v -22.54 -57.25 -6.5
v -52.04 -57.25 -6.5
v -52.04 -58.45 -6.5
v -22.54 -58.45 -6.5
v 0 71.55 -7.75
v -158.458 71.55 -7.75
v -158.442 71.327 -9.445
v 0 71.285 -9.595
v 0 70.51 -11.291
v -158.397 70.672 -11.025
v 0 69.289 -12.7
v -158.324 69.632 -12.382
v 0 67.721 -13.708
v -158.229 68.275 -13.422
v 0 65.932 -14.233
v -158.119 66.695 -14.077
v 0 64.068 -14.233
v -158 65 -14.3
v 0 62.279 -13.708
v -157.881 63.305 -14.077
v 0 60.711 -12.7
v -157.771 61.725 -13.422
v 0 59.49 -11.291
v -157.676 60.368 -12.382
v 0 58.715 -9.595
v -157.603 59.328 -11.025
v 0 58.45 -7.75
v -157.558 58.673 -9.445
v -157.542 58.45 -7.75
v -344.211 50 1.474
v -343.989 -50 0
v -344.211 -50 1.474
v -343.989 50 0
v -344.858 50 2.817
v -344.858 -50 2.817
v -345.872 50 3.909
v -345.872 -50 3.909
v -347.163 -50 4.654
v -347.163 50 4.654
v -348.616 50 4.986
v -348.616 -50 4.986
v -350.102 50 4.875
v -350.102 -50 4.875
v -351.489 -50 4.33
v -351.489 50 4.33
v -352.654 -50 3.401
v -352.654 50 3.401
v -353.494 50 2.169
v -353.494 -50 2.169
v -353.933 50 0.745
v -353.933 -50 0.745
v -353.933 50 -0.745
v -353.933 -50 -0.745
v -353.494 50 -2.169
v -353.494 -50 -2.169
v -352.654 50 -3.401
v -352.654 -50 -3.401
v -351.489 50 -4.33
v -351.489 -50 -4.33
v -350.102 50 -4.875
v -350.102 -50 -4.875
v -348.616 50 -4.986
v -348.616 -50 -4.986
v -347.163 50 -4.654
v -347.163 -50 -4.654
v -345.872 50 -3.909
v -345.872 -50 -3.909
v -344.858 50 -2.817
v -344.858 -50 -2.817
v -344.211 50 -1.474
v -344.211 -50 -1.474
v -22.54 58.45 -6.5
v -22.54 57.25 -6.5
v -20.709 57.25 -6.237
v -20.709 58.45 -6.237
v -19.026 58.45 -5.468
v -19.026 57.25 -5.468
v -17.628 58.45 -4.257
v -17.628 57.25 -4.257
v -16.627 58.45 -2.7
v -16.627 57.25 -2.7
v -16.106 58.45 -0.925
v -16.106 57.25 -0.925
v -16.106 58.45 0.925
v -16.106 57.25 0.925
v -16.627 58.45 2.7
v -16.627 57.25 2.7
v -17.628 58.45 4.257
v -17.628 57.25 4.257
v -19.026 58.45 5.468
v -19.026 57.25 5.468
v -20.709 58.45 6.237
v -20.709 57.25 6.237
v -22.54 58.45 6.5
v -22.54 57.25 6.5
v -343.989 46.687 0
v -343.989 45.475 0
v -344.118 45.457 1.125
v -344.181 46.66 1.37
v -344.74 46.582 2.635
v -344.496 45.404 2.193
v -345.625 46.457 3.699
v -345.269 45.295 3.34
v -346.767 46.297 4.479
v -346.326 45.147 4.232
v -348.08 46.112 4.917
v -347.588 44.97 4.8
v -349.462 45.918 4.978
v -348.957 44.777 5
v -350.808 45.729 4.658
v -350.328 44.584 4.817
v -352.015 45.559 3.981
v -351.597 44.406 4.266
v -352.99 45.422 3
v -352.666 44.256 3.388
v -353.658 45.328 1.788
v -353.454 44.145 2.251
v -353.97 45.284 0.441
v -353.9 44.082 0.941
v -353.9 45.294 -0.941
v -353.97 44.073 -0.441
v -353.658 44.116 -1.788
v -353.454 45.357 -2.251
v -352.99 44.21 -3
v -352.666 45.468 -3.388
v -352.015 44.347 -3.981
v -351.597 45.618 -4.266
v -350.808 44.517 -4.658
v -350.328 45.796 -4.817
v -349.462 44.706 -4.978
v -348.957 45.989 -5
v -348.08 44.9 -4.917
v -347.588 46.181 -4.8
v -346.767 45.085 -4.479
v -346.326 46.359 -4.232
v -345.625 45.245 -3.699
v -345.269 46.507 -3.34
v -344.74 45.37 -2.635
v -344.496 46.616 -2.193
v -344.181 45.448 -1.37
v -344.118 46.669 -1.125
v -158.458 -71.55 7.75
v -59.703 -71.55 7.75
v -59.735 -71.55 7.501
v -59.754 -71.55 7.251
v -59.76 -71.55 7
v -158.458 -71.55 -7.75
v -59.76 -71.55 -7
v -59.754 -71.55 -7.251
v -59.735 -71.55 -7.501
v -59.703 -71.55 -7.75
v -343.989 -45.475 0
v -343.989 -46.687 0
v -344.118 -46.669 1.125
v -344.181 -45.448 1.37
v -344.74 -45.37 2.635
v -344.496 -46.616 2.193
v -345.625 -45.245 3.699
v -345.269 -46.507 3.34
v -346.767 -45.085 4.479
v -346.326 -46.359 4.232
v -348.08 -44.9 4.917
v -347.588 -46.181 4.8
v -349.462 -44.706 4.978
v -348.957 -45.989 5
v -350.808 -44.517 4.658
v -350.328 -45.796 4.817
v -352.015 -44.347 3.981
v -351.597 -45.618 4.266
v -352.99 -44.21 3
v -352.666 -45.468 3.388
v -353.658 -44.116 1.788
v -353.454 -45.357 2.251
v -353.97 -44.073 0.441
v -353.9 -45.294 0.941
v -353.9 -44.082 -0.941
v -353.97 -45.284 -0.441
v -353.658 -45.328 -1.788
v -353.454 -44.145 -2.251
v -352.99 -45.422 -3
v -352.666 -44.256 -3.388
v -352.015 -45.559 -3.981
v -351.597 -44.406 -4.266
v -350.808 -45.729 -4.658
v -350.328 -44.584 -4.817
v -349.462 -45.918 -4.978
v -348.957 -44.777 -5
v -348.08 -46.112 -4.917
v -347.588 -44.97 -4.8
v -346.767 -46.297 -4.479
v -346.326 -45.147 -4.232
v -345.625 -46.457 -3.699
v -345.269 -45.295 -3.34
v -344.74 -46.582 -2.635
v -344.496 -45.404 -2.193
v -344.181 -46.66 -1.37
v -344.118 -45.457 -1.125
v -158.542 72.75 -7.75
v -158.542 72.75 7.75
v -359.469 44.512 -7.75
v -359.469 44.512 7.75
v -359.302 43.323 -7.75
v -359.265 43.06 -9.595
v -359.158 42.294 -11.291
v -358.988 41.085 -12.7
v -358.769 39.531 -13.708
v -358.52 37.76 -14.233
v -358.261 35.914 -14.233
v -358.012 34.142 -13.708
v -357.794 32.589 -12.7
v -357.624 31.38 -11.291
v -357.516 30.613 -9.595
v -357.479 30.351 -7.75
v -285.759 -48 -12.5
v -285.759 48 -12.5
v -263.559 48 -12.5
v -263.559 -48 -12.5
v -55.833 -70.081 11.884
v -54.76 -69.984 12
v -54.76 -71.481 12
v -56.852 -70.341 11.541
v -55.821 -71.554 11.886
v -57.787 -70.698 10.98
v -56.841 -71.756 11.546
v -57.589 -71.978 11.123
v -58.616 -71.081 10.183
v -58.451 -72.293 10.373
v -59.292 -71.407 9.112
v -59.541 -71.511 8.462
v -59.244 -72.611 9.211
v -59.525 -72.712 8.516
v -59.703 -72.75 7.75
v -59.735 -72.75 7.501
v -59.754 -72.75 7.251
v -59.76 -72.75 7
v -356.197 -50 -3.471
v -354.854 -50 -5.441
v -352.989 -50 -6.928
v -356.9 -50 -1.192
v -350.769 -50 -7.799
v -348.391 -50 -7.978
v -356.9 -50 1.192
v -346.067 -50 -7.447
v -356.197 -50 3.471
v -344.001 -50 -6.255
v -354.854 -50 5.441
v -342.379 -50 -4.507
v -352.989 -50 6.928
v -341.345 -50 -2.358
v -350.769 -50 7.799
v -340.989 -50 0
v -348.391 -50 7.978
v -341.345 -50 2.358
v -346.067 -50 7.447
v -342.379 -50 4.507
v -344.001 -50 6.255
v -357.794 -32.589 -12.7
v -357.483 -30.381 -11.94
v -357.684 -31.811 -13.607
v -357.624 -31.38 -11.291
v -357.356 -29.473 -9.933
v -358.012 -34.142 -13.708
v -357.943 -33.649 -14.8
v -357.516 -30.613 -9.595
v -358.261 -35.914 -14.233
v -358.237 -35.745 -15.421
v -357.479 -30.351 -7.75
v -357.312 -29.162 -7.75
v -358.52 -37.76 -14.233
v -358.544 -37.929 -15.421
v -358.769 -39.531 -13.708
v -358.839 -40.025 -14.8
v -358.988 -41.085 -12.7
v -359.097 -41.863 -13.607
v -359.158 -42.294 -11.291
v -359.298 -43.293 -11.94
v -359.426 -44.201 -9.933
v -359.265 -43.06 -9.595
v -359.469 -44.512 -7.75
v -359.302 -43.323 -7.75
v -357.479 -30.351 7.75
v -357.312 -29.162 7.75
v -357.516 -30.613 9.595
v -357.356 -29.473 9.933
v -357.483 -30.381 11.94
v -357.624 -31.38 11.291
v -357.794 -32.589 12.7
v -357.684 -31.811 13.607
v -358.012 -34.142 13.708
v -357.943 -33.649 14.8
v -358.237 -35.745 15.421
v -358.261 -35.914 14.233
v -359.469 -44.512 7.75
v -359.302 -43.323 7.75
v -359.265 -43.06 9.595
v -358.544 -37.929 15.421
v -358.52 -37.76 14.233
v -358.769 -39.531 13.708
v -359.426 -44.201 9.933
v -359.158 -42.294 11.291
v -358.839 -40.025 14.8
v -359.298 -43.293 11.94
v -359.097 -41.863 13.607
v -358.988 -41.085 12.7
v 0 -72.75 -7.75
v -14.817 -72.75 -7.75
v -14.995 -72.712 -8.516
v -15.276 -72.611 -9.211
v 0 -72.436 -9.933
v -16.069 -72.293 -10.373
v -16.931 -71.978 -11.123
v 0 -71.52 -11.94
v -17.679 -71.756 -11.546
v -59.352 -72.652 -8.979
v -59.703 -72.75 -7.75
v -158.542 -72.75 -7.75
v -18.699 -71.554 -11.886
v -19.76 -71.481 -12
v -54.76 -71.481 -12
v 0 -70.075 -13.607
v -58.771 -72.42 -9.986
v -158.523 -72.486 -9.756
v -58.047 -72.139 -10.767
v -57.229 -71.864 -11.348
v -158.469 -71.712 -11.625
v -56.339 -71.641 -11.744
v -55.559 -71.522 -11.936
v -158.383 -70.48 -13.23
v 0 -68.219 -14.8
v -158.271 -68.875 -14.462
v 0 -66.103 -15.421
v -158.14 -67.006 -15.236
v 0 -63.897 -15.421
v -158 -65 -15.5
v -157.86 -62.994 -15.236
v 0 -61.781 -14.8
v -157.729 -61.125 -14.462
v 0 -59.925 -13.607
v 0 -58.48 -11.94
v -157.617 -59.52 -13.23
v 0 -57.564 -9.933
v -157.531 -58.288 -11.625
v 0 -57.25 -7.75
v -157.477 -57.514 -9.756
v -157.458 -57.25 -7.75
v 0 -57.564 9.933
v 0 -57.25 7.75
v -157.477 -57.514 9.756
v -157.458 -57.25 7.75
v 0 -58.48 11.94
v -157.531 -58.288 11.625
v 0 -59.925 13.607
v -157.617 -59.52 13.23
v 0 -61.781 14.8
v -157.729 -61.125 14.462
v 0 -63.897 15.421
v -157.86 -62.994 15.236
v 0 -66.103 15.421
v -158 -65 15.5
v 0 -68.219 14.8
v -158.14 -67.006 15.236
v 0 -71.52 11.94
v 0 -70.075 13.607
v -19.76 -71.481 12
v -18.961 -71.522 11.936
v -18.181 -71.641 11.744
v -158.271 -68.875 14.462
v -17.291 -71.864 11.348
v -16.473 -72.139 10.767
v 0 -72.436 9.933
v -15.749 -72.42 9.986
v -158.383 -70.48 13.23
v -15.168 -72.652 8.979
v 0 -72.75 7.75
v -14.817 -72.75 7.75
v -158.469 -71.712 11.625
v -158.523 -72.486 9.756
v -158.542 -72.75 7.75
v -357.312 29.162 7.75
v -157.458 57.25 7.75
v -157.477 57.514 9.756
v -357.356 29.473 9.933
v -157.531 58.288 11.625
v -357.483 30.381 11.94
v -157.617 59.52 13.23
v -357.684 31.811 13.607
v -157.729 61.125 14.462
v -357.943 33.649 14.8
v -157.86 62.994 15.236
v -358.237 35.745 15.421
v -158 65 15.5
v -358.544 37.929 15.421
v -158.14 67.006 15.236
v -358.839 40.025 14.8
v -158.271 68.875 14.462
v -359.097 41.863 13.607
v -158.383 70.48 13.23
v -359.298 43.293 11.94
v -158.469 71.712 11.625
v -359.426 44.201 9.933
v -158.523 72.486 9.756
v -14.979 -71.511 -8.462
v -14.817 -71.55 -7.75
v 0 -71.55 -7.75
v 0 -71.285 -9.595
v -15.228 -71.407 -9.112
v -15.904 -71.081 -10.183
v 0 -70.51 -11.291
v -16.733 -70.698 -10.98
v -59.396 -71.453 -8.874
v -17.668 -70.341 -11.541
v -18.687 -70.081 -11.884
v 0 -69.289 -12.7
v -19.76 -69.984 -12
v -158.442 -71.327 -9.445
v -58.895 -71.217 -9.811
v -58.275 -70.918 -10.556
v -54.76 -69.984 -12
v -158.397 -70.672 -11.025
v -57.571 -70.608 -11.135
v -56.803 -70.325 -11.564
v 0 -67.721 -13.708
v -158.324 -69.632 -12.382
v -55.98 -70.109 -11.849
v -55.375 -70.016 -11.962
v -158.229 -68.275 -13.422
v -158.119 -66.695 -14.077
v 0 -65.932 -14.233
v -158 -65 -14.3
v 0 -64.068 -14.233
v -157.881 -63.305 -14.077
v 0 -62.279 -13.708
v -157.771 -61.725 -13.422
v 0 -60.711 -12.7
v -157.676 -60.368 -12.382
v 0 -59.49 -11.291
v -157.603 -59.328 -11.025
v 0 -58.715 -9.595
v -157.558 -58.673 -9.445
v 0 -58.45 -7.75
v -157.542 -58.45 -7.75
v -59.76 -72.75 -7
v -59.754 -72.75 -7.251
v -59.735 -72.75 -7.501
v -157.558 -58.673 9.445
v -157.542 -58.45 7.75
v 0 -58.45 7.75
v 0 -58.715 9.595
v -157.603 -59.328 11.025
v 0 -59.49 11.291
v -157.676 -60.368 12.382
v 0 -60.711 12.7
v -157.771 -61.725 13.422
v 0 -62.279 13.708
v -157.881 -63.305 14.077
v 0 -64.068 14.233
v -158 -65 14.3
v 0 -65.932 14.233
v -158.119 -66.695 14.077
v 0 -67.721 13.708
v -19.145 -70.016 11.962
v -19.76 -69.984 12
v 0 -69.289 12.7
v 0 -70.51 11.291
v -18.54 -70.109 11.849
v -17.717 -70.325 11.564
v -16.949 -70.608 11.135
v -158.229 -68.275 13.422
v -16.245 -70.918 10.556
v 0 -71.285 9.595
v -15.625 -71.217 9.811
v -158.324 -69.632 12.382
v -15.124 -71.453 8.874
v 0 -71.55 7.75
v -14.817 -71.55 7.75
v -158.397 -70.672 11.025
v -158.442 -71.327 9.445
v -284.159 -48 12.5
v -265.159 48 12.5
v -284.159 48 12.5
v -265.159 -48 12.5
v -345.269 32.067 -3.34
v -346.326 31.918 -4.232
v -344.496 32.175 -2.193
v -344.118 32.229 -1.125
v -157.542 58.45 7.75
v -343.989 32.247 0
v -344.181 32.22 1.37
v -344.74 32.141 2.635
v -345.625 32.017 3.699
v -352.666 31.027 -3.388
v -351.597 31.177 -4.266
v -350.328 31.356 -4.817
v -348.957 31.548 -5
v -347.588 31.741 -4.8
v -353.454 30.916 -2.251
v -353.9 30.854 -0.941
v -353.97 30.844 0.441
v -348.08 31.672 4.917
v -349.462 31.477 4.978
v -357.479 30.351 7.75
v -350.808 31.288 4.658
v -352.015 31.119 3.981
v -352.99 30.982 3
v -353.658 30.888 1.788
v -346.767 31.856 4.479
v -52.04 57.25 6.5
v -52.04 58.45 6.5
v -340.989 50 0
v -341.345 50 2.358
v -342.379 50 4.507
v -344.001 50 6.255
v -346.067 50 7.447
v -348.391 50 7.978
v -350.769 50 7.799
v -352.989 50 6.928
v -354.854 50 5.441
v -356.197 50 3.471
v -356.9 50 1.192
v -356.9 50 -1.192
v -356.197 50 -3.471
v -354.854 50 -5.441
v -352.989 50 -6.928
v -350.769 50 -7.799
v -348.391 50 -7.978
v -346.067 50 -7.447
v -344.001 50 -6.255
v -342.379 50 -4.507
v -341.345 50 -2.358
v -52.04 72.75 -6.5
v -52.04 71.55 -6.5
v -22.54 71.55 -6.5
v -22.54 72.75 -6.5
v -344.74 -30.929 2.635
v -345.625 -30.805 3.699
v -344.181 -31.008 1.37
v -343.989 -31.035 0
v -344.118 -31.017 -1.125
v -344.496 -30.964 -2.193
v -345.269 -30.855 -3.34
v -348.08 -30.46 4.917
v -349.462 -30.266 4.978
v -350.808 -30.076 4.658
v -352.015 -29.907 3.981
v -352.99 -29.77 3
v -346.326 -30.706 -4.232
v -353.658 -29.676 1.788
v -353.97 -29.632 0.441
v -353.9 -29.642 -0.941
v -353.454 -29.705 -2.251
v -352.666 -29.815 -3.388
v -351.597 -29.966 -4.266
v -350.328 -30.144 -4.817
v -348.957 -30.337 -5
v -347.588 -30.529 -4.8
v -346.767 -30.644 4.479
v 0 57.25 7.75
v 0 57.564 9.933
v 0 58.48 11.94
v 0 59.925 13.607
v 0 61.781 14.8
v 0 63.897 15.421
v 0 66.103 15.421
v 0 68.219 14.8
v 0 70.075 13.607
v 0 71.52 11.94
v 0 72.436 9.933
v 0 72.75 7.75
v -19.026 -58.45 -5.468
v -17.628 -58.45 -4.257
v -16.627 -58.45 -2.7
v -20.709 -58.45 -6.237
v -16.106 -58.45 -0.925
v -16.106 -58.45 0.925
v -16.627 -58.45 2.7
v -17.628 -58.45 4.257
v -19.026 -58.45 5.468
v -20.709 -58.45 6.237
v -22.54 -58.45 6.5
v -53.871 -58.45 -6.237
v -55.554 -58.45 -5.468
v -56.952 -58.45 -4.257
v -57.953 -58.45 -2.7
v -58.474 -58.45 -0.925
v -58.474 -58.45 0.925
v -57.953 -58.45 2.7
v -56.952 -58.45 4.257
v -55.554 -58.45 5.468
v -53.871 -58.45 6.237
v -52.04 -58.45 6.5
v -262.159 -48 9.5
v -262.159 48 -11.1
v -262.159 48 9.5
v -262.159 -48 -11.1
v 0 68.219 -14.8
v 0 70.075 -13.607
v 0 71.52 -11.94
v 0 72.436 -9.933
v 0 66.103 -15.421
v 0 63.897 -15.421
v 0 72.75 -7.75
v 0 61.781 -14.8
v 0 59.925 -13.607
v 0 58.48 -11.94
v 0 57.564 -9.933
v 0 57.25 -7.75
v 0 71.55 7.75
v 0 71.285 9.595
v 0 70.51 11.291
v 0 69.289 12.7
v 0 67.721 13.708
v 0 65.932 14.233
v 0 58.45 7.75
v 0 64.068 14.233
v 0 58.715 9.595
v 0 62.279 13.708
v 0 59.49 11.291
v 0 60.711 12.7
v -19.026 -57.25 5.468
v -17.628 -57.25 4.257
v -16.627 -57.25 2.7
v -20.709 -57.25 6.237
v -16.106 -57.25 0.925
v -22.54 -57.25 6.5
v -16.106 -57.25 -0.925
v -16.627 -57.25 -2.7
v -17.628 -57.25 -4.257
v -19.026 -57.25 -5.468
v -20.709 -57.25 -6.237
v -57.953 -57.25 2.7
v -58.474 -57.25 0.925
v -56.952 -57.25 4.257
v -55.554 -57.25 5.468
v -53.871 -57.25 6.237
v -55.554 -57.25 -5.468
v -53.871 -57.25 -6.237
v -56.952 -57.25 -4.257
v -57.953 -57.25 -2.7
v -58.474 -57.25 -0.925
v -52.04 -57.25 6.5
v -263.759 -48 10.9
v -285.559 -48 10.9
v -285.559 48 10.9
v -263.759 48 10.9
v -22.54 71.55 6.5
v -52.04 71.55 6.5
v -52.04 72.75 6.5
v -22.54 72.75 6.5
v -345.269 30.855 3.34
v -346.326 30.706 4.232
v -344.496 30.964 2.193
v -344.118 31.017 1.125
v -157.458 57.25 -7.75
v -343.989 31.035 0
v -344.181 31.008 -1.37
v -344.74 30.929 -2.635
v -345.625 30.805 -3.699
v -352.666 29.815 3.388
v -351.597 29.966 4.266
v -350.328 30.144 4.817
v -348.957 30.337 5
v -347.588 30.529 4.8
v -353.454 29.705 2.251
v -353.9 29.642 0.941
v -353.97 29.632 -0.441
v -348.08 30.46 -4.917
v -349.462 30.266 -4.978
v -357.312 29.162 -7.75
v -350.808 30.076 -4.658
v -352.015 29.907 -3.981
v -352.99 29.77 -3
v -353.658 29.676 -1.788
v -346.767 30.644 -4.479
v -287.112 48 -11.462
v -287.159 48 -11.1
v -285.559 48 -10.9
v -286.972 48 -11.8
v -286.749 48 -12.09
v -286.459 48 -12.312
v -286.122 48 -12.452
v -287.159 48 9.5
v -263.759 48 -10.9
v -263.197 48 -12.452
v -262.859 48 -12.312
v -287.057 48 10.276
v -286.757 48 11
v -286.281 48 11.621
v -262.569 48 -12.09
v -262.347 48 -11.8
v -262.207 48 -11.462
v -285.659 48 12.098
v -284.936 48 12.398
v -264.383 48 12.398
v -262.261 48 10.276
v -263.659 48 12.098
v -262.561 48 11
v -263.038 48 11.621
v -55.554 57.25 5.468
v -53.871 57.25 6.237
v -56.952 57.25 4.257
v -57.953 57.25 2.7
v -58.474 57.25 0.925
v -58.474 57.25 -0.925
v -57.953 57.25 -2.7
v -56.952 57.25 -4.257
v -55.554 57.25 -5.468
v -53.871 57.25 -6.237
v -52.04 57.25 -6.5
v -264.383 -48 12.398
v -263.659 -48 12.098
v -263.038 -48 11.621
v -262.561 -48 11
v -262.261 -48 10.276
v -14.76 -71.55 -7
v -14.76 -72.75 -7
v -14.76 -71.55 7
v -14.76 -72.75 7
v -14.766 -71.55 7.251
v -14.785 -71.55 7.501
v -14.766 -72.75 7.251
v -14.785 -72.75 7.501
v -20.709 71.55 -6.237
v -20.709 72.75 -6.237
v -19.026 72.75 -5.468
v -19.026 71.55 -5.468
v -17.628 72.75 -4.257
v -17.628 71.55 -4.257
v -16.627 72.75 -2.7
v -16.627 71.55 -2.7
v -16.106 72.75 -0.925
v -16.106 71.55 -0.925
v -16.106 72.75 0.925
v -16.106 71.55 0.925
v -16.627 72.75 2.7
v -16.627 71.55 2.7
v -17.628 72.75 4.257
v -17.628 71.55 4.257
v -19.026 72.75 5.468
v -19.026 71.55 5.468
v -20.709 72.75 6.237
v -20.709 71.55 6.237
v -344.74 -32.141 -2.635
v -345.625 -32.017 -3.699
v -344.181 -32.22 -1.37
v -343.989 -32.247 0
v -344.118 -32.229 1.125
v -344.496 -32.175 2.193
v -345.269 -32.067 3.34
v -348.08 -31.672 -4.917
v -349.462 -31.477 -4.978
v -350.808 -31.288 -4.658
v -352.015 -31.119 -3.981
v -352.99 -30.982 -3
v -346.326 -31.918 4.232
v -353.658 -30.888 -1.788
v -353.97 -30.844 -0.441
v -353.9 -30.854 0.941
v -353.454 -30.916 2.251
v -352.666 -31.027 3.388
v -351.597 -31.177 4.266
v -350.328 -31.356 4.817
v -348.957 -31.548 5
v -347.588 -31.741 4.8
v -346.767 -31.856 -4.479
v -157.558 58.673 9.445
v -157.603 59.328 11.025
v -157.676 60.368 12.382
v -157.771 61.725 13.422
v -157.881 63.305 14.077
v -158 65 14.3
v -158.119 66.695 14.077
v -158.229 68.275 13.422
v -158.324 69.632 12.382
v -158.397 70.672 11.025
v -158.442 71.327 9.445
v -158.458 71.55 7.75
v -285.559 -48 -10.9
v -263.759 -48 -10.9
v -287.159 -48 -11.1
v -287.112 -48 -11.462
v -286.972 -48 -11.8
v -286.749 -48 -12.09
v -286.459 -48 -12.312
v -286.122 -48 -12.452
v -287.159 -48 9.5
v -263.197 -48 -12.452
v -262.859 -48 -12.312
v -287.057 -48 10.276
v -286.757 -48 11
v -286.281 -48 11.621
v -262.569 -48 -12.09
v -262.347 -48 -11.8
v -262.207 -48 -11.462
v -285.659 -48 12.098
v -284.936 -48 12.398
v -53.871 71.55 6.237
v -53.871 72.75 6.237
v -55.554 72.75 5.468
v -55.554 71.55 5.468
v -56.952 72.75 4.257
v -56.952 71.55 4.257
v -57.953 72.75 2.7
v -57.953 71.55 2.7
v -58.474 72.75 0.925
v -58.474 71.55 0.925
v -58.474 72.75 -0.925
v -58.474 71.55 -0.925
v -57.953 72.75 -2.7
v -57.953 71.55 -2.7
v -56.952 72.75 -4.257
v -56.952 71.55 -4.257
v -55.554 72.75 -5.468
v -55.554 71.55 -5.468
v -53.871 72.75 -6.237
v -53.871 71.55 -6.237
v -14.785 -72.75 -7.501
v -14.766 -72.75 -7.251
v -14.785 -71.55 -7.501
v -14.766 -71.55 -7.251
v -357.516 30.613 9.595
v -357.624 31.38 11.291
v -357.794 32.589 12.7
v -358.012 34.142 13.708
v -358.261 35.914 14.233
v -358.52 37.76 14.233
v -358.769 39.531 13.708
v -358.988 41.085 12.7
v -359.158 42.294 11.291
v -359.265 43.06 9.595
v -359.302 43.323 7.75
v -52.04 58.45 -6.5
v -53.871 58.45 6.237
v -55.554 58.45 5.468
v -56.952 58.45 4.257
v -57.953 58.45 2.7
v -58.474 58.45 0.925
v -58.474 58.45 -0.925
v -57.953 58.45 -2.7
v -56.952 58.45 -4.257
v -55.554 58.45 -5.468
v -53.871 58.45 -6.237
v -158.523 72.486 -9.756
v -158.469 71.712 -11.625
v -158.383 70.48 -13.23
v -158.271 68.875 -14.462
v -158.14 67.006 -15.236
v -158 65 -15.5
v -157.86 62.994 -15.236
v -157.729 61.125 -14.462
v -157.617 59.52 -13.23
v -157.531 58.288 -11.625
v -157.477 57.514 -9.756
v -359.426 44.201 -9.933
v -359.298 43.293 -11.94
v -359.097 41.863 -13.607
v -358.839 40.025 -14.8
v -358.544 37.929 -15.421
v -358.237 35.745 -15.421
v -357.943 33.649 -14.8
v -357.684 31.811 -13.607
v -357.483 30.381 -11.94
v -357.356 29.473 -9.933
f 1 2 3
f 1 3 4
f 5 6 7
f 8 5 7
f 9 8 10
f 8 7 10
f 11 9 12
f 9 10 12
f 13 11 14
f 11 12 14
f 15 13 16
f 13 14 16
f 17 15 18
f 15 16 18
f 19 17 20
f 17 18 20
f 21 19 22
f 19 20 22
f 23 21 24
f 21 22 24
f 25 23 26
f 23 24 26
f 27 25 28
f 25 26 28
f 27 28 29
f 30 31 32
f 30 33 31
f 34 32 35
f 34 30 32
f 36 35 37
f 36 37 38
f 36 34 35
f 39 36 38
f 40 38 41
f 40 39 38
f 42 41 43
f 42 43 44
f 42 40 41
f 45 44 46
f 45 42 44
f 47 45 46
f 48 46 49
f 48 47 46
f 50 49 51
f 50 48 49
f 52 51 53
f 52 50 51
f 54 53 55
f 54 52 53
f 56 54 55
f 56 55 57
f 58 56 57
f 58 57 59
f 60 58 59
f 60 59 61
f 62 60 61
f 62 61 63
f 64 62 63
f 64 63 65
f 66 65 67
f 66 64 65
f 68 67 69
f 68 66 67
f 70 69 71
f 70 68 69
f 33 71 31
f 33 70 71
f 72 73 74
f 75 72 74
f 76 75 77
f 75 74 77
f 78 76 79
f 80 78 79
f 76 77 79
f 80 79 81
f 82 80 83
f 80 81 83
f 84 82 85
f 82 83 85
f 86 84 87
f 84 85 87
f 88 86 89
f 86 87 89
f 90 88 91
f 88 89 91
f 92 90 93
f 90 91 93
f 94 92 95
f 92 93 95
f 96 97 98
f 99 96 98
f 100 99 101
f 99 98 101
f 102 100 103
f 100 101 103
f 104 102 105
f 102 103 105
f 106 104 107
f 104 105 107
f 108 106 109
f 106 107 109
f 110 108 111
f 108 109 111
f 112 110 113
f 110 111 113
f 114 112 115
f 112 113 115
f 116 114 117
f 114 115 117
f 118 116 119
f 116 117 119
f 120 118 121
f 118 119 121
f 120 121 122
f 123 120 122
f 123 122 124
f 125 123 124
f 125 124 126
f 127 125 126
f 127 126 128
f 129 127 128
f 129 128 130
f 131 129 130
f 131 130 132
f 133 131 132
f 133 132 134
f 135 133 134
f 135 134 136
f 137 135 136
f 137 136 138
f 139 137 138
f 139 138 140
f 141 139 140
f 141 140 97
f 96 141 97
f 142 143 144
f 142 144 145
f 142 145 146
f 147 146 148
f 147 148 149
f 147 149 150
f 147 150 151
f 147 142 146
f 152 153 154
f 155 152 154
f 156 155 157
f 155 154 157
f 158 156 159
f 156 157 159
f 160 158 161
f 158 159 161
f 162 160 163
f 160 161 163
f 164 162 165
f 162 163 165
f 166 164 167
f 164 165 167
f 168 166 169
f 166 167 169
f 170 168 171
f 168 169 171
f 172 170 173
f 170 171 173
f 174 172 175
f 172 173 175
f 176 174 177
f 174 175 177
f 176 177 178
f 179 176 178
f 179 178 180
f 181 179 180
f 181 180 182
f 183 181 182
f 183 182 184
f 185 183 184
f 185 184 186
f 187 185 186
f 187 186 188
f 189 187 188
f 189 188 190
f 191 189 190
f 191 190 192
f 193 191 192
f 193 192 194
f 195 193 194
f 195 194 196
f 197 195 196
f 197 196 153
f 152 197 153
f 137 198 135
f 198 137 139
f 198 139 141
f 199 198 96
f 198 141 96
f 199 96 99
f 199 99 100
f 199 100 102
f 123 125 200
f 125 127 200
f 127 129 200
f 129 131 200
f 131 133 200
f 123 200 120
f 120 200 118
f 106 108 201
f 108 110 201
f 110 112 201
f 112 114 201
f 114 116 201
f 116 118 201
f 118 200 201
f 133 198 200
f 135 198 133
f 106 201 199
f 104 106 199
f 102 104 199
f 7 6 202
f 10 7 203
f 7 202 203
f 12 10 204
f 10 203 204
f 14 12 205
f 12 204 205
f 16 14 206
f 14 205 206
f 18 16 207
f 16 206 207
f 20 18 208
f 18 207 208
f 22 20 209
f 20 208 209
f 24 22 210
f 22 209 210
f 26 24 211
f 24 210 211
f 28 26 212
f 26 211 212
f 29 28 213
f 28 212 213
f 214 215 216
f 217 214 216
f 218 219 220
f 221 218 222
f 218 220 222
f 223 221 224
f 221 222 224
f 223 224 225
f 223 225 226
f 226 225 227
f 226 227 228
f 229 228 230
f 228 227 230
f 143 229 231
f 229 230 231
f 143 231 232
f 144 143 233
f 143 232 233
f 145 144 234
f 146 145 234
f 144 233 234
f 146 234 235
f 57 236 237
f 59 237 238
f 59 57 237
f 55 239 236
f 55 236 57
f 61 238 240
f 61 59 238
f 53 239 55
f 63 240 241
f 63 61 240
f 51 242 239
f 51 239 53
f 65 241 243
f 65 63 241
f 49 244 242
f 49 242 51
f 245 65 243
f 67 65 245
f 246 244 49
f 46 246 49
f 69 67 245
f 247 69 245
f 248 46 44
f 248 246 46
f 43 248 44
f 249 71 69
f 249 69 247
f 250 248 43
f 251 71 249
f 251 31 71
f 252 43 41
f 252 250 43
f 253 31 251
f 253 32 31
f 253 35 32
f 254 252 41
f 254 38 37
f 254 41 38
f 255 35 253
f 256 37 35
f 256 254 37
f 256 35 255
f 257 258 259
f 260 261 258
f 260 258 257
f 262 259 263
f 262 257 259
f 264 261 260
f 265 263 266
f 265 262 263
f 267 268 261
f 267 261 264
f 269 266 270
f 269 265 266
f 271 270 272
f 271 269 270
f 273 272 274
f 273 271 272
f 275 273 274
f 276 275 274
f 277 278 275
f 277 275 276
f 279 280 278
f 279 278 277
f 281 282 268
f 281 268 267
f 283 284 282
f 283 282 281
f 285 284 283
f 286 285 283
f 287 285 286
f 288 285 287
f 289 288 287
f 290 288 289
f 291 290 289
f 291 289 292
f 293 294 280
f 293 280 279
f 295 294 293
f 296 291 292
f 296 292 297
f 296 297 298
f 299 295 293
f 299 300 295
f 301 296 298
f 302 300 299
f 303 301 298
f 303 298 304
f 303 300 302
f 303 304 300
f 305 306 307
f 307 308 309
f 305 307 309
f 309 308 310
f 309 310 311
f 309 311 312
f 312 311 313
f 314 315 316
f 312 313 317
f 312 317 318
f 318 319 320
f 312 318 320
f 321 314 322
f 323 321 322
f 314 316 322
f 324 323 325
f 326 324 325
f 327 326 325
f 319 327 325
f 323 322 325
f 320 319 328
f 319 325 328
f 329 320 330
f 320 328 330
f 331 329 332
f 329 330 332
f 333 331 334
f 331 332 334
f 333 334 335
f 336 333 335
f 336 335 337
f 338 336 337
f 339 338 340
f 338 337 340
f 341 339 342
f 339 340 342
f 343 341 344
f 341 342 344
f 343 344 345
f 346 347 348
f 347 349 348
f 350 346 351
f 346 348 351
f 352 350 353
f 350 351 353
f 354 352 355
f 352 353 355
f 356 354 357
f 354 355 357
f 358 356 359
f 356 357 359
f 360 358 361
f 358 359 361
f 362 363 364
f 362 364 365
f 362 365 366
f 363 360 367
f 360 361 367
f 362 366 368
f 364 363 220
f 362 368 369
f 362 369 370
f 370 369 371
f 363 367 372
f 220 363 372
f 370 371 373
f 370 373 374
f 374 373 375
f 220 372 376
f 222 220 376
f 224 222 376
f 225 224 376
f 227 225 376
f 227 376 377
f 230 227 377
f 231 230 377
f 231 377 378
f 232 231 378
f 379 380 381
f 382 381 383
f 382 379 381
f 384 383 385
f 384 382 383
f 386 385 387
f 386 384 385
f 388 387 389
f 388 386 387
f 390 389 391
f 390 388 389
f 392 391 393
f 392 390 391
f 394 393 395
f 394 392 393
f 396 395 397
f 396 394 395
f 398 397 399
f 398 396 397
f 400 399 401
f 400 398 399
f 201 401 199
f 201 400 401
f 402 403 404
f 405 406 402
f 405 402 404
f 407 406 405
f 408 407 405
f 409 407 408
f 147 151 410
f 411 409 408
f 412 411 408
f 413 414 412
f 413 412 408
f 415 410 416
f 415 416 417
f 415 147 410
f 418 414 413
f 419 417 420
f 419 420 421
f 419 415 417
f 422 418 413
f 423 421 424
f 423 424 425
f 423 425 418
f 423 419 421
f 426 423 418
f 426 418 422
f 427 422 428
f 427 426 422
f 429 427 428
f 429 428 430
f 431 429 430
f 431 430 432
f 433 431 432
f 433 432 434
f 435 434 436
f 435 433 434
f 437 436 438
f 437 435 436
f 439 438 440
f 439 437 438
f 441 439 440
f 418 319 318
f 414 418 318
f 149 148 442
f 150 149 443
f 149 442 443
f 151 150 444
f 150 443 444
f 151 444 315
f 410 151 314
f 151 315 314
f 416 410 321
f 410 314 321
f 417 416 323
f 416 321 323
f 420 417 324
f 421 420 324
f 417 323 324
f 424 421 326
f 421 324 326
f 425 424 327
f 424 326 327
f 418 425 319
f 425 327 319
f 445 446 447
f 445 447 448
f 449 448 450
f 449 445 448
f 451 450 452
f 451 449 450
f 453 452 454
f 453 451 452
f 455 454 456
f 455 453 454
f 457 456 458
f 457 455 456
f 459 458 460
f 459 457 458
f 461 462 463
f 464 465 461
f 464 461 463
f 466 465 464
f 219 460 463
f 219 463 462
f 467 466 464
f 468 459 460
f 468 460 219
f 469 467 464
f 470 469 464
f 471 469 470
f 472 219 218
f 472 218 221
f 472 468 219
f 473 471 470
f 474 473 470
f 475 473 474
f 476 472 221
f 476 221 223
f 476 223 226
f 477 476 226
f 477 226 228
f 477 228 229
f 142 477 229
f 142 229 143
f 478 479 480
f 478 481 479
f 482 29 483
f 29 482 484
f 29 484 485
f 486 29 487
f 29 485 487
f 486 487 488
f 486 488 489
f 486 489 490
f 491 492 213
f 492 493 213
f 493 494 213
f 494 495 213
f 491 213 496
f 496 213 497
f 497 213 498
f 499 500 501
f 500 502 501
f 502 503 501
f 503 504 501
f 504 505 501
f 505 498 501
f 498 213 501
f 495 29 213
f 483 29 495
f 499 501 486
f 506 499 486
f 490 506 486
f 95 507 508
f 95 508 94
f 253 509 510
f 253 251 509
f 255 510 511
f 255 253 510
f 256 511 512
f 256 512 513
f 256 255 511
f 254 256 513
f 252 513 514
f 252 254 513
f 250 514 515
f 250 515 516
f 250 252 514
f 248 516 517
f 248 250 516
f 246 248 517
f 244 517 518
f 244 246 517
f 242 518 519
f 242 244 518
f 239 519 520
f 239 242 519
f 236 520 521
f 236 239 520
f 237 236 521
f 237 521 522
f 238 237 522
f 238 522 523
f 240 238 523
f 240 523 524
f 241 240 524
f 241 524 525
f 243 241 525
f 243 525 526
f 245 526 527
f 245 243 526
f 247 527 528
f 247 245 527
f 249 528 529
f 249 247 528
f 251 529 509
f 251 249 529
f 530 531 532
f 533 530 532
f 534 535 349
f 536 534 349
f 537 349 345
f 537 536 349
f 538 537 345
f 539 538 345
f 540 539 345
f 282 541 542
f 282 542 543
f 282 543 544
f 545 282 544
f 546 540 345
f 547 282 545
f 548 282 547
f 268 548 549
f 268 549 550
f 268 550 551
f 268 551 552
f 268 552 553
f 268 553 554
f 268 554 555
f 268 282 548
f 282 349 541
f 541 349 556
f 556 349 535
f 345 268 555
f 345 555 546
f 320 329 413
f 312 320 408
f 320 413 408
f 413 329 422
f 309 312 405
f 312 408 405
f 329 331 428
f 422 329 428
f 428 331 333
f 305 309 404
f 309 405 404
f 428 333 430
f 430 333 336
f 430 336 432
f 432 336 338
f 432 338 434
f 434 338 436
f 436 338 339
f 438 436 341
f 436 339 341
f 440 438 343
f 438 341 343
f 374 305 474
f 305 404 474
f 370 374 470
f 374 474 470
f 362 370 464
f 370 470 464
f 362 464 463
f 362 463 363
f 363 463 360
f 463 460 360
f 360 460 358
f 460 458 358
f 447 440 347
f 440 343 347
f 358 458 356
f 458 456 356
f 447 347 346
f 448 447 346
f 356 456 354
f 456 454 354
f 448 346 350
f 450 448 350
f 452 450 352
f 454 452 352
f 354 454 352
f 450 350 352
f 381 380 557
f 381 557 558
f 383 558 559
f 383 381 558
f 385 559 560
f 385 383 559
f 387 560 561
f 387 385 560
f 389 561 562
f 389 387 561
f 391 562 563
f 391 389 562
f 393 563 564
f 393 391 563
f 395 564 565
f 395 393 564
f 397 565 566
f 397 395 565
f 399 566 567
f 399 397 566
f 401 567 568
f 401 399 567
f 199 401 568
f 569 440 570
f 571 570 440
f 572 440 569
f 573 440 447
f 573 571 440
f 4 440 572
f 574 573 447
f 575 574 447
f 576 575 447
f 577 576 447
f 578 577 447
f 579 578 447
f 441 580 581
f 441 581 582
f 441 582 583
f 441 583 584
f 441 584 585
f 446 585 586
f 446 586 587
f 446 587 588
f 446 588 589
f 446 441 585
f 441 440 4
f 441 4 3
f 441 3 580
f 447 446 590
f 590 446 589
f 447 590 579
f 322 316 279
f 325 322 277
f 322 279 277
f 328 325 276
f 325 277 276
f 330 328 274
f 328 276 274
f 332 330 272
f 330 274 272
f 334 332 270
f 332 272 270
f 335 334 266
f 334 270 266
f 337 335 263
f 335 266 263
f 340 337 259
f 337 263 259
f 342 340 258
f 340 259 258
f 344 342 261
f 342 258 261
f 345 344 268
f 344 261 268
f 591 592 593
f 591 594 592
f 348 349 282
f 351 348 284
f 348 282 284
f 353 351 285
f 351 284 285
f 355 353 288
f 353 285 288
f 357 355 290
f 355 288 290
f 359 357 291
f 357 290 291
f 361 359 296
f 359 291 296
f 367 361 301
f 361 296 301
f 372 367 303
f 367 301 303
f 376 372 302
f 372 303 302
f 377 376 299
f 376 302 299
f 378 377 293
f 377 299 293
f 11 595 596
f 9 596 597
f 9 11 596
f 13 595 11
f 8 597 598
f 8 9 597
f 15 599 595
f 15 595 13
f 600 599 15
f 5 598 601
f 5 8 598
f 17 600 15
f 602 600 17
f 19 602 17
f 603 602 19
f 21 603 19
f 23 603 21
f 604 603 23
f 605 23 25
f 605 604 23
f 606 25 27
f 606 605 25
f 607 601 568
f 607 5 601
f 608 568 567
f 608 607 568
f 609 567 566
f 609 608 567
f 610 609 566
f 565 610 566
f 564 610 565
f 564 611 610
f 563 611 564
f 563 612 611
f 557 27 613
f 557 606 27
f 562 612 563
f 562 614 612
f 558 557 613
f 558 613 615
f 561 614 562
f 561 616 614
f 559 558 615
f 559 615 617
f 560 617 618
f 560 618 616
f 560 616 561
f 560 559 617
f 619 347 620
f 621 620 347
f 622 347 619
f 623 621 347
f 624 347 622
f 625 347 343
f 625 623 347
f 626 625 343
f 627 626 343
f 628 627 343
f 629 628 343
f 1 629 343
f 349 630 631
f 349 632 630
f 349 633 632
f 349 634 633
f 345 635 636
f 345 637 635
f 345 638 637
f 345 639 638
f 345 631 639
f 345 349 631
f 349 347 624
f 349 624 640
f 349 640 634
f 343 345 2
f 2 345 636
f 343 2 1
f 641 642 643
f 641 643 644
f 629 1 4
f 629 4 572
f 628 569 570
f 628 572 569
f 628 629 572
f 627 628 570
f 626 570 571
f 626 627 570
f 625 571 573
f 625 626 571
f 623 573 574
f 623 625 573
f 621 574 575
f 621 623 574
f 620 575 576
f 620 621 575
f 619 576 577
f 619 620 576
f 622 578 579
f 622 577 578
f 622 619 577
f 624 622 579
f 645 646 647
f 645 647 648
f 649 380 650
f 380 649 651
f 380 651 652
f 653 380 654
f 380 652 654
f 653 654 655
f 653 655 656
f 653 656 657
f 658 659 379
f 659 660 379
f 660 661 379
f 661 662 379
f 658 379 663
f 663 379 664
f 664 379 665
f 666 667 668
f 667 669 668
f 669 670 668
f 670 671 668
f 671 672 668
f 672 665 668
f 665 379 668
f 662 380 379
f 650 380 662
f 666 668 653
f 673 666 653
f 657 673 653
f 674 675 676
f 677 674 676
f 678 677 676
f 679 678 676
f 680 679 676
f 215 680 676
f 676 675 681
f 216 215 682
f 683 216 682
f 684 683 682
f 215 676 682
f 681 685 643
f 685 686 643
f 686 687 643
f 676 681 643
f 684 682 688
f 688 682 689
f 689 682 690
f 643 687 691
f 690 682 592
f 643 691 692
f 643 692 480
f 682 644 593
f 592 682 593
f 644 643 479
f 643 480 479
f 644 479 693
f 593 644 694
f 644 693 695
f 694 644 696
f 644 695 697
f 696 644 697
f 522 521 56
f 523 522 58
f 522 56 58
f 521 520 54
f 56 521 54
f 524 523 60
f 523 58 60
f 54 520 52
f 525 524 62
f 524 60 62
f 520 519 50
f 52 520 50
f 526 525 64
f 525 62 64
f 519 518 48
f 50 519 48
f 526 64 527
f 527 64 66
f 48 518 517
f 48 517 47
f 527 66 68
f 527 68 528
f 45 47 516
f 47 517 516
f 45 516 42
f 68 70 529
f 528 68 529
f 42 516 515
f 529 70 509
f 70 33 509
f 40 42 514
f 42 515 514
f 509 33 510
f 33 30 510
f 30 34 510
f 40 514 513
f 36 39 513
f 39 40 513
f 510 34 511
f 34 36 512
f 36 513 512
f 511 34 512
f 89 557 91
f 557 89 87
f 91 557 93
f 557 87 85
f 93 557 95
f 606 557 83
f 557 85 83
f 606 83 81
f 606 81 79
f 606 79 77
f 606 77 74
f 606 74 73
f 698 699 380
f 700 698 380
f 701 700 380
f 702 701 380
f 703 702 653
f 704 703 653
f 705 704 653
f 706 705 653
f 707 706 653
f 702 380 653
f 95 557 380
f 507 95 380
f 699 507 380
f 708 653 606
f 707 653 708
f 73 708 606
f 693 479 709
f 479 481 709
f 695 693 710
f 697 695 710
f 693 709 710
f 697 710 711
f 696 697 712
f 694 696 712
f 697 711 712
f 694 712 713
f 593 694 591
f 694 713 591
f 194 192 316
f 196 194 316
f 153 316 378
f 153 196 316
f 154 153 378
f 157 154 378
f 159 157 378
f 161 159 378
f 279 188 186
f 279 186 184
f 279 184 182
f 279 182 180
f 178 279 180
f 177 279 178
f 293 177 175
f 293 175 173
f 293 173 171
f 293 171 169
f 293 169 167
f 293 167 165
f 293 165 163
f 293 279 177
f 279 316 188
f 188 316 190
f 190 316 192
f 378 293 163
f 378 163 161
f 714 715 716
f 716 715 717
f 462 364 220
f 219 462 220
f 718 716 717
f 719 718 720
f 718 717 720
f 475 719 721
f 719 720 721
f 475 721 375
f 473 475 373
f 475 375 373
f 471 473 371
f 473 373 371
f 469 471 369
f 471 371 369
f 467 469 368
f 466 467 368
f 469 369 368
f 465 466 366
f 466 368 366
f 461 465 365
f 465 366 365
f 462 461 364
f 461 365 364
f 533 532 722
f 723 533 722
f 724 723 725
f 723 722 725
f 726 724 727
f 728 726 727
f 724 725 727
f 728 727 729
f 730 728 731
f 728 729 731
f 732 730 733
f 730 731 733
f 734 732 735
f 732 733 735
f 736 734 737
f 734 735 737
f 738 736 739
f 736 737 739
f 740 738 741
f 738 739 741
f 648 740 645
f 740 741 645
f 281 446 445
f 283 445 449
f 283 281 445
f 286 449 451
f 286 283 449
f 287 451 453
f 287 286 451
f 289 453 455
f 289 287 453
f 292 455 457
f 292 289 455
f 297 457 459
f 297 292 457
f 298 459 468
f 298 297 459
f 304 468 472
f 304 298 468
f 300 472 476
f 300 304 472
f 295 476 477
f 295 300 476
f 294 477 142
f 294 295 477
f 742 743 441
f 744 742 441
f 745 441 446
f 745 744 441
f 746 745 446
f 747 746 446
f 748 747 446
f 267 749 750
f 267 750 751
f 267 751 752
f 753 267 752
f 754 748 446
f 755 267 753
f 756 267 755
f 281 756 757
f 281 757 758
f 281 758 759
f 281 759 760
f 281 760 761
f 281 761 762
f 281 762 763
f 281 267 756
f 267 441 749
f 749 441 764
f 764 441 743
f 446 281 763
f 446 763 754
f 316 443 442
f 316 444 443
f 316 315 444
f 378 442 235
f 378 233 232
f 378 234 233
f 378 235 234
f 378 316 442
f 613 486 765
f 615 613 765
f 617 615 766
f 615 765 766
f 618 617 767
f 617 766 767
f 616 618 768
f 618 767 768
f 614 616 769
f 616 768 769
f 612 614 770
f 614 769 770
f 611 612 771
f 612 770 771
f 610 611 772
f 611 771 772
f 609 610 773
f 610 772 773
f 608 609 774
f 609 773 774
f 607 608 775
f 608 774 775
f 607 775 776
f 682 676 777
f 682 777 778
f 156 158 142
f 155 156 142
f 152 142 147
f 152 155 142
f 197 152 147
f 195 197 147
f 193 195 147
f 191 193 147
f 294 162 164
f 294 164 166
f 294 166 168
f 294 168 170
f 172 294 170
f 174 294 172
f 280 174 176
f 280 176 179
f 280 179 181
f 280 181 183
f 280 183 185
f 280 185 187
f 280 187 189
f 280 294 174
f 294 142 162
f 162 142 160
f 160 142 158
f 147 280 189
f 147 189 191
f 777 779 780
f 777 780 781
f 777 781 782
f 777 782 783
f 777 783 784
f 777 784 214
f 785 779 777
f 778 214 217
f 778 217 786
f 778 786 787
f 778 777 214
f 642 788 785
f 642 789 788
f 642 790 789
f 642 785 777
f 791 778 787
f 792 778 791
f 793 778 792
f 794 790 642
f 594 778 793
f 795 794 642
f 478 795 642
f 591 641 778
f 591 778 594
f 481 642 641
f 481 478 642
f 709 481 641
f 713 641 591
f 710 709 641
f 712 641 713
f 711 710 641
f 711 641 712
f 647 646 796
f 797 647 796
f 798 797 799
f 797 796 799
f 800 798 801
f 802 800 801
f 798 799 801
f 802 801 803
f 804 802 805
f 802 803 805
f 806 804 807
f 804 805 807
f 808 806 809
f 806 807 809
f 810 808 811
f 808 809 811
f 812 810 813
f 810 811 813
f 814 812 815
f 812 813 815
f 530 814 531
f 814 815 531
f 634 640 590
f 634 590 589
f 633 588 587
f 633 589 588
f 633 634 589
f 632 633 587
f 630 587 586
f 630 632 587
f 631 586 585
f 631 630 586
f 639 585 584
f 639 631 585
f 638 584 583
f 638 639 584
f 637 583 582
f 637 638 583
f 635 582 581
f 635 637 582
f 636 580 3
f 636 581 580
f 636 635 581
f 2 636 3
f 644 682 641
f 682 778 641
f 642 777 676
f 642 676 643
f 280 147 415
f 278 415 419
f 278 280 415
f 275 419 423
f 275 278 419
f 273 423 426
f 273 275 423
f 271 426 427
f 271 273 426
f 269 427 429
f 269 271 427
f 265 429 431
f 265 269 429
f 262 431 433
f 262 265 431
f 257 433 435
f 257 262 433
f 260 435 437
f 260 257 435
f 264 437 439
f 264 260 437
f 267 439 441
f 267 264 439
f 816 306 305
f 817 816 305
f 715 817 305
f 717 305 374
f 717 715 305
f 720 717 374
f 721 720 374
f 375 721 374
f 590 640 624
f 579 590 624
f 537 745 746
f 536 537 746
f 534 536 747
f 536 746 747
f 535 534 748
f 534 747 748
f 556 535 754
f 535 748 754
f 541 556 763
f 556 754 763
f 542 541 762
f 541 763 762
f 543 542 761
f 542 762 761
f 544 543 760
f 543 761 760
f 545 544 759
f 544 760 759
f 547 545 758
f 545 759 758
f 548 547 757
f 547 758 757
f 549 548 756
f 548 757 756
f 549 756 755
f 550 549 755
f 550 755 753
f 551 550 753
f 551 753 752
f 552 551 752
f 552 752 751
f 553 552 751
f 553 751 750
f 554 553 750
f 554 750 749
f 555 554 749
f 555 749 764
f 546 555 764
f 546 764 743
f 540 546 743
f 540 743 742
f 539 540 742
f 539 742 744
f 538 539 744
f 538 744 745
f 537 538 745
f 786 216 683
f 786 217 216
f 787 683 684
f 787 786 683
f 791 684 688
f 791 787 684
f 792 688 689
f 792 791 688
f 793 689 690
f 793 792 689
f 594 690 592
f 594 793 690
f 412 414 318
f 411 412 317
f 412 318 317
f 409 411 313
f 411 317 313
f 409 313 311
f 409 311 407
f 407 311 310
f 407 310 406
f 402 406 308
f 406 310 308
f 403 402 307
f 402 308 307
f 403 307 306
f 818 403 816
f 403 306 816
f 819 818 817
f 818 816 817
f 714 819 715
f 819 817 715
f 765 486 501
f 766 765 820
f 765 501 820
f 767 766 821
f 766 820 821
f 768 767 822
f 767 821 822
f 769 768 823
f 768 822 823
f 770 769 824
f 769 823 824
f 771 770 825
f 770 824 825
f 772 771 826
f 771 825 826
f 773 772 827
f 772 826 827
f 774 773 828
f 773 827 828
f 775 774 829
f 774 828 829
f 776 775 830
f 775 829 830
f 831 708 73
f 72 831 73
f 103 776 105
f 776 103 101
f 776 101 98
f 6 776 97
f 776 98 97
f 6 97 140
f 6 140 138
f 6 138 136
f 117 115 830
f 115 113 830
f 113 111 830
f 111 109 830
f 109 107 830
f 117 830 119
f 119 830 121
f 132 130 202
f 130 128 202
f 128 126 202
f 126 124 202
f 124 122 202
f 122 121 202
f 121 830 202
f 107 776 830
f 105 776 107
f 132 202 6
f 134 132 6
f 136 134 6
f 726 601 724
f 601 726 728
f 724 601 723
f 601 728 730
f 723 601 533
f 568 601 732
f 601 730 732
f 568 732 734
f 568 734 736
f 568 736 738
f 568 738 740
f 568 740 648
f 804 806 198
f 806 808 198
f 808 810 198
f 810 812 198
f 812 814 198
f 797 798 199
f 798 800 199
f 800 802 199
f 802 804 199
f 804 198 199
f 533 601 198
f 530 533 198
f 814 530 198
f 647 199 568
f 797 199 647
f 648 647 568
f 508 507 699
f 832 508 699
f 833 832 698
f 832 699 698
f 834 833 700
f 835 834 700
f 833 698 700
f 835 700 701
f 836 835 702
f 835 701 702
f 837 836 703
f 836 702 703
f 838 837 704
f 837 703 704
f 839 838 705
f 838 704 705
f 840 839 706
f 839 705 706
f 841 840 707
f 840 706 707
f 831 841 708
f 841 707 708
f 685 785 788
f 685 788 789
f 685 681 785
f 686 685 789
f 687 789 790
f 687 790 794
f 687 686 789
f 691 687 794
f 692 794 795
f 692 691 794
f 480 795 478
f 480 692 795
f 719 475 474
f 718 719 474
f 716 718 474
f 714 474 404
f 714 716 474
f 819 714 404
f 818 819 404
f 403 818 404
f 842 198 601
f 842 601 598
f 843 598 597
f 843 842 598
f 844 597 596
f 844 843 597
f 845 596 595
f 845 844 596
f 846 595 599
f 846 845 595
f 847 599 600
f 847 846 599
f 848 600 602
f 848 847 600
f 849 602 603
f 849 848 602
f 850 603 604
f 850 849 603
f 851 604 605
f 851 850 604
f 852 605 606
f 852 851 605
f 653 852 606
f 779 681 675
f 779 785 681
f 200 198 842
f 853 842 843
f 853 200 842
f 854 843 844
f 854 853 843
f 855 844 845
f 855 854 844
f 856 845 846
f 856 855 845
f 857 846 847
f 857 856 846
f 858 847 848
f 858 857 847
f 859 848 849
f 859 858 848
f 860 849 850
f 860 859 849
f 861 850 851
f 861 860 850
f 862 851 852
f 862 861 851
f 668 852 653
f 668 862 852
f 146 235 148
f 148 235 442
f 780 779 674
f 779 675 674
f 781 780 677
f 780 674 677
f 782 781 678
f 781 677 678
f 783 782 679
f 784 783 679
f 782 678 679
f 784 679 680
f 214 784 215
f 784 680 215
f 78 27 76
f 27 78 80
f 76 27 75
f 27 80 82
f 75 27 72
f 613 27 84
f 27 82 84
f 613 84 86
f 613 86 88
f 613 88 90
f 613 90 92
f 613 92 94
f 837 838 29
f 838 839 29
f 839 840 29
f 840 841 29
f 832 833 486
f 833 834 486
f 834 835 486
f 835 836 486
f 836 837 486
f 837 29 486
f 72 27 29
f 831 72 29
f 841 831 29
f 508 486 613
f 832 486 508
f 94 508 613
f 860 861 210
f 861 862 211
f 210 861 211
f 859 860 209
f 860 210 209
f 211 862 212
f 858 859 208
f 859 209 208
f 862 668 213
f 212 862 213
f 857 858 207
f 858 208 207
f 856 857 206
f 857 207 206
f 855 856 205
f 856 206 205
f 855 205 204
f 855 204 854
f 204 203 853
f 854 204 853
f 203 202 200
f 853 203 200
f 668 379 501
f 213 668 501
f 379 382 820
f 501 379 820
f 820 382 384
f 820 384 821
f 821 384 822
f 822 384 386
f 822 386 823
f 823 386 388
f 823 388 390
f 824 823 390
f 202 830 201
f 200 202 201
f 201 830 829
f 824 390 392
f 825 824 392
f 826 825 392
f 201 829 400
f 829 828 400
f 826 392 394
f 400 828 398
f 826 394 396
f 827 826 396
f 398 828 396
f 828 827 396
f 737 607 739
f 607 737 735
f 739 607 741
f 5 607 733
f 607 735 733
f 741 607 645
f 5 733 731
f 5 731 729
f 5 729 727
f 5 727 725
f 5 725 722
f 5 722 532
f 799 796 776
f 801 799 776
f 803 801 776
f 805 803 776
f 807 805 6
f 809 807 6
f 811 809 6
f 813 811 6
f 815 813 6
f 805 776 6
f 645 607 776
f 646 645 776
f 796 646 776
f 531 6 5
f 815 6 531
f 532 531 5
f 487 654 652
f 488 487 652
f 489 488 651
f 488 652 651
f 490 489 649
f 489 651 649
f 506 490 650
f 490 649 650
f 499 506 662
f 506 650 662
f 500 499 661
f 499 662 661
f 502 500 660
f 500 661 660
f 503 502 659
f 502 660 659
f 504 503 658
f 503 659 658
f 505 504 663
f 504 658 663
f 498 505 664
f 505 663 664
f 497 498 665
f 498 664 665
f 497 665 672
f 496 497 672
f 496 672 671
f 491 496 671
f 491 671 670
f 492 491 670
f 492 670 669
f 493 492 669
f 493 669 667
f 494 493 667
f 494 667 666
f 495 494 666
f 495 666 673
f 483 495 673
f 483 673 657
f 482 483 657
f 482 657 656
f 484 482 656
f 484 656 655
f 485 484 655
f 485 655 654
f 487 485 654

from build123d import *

# Parameters (mm, degrees)
F4_W      = 29.5
F4_H      = 13
F5_DEPTH  = 99
F6_DEPTH  = 86
F7_R      = 8
F7_R_2    = 5
F8_DEPTH  = 50
F9_W      = 1.6
F9_H      = 1.6
F9_W_2    = 21.8
F9_H_2    = 21.8
F10_DEPTH = 48
F11_R     = 3
F12_R     = 1.4
F15_DEPTH = 8
F16_R     = 5
F17_DEPTH = 122.751
F18_DEPTH = 10


with BuildPart() as f2:
    # F2: sweep along a path in F0
    with BuildLine(Plane.XY) as f2_path:
        Line((0, 65), (-158, 65))
        Line((-158, 65), (-358.3906463905, 36.8369312897))
    # F1 (on Right) → F2 (sweep)
    with BuildSketch(Plane.YZ):
        with BuildLine():
            ThreePointArc((72.75, 7.75), (65, 15.5), (57.25, 7.75))
            Line((57.25, 7.75), (57.25, -7.75))
            ThreePointArc((57.25, -7.75), (65, -15.5), (72.75, -7.75))
            Line((72.75, -7.75), (72.75, 7.75))
        make_face()
        with BuildLine():
            ThreePointArc((58.45, 7.75), (65, 14.3), (71.55, 7.75))
            Line((71.55, 7.75), (71.55, -7.75))
            ThreePointArc((71.55, -7.75), (65, -14.3), (58.45, -7.75))
            Line((58.45, -7.75), (58.45, 7.75))
        make_face(mode=Mode.SUBTRACT)
    sweep(path=f2_path.line, transition=Transition.RIGHT)


with BuildPart() as f3_1:
    # F3: instance of F2
    add(f2.part.mirror(Plane.XZ))

    # F4 (on Front) → F5 (cut)
    with BuildSketch(Plane.XZ):
        with Locations((-37.29, 0)):
            Rectangle(F4_W, F4_H)
        with BuildLine():
            Line((-52.04, -6.5), (-52.04, 6.5))
            ThreePointArc((-52.04, 6.5), (-58.54, 0), (-52.04, -6.5))
        make_face()
        with BuildLine():
            ThreePointArc((-22.54, -6.5), (-16.04, 0), (-22.54, 6.5))
            Line((-22.54, 6.5), (-22.54, -6.5))
        make_face()
    extrude(amount=F5_DEPTH, mode=Mode.SUBTRACT)

    # F14 (on face) → F15 (cut)
    with BuildSketch(Plane.XZ.offset(72.75)):
        with BuildLine():
            ThreePointArc((-14.76, 7), (-16.2244660941, 10.5355339059), (-19.76, 12))
            Line((-19.76, 12), (-54.76, 12))
            ThreePointArc((-54.76, 12), (-58.2955339059, 10.5355339059), (-59.76, 7))
            Line((-59.76, 7), (-59.76, -7))
            ThreePointArc((-59.76, -7), (-58.2955339059, -10.5355339059), (-54.76, -12))
            Line((-54.76, -12), (-19.76, -12))
            ThreePointArc((-19.76, -12), (-16.2244660941, -10.5355339059), (-14.76, -7))
            Line((-14.76, -7), (-14.76, 7))
        make_face()
    extrude(amount=-F15_DEPTH, mode=Mode.SUBTRACT)


with BuildPart() as f2_1:
    add(f2.part)

    # F4 (on Front) → F6 (cut)
    with BuildSketch(Plane.XZ):
        with Locations((-37.29, 0)):
            Rectangle(F4_W, F4_H)
        with BuildLine():
            Line((-52.04, -6.5), (-52.04, 6.5))
            ThreePointArc((-52.04, 6.5), (-58.54, 0), (-52.04, -6.5))
        make_face()
        with BuildLine():
            ThreePointArc((-22.54, -6.5), (-16.04, 0), (-22.54, 6.5))
            Line((-22.54, 6.5), (-22.54, -6.5))
        make_face()
    extrude(amount=-F6_DEPTH, mode=Mode.SUBTRACT)


with BuildPart() as f8:
    # F7 (on Front) → F8 (new body, symmetric)
    with BuildSketch(Plane.XZ):
        with Locations((-348.989237923, 0)):
            Circle(F7_R)
        with Locations((-348.989237923, 0)):
            Circle(F7_R_2, mode=Mode.SUBTRACT)
    extrude(amount=F8_DEPTH, both=True)


with BuildPart() as f10:
    # F9 (on Front) → F10 (new body, symmetric)
    with BuildSketch(Plane.XZ):
        with Locations((-286.359237923, 11.7)):
            Rectangle(F9_W, F9_H)
        with Locations((-274.659237923, 11.7)):
            Rectangle(F9_W_2, F9_H)
        with Locations((-286.359237923, 0)):
            Rectangle(F9_W, F9_H_2)
        with Locations((-262.959237923, 11.7)):
            Rectangle(F9_W, F9_H)
        with Locations((-286.359237923, -11.7)):
            Rectangle(F9_W, F9_H)
        with Locations((-262.959237923, 0)):
            Rectangle(F9_W, F9_H_2)
        with Locations((-274.659237923, -11.7)):
            Rectangle(F9_W_2, F9_H)
        with Locations((-262.959237923, -11.7)):
            Rectangle(F9_W, F9_H)
    extrude(amount=F10_DEPTH, both=True)

    # F11
    f11_edges = [f10.edges().sort_by_distance(p)[0] for p in [
        (-262.159238, 0, 12.5),
        (-287.159238, 0, 12.5),
    ]]
    fillet(f11_edges, radius=F11_R)

    # F12
    f12_edges = [f10.edges().sort_by_distance(p)[0] for p in [
        (-262.159238, 0, -12.5),
        (-287.159238, 0, -12.5),
    ]]
    fillet(f12_edges, radius=F12_R)


with BuildPart() as f17_tool:
    # F16 (on face) → F17 (new body, through all)
    with BuildSketch(Plane.XZ.offset(50)):
        with Locations((-348.989237923, 0)):
            Circle(F16_R)
    extrude(amount=-F17_DEPTH)


with BuildPart() as f2_2:
    add(f2_1.part)

    # F17: cut by f17_tool
    add(f17_tool.part, mode=Mode.SUBTRACT)

    # F14 (on face) → F18 (cut)
    with BuildSketch(Plane.XZ.offset(72.75)):
        with BuildLine():
            ThreePointArc((-14.76, 7), (-16.2244660941, 10.5355339059), (-19.76, 12))
            Line((-19.76, 12), (-54.76, 12))
            ThreePointArc((-54.76, 12), (-58.2955339059, 10.5355339059), (-59.76, 7))
            Line((-59.76, 7), (-59.76, -7))
            ThreePointArc((-59.76, -7), (-58.2955339059, -10.5355339059), (-54.76, -12))
            Line((-54.76, -12), (-19.76, -12))
            ThreePointArc((-19.76, -12), (-16.2244660941, -10.5355339059), (-14.76, -7))
            Line((-14.76, -7), (-14.76, 7))
        make_face()
    extrude(amount=-F18_DEPTH, mode=Mode.SUBTRACT)


with BuildPart() as f3_1_1:
    add(f3_1.part)

    # F17: cut by f17_tool
    add(f17_tool.part, mode=Mode.SUBTRACT)


solid = Compound([f8.part, f10.part, f2_2.part, f3_1_1.part])
